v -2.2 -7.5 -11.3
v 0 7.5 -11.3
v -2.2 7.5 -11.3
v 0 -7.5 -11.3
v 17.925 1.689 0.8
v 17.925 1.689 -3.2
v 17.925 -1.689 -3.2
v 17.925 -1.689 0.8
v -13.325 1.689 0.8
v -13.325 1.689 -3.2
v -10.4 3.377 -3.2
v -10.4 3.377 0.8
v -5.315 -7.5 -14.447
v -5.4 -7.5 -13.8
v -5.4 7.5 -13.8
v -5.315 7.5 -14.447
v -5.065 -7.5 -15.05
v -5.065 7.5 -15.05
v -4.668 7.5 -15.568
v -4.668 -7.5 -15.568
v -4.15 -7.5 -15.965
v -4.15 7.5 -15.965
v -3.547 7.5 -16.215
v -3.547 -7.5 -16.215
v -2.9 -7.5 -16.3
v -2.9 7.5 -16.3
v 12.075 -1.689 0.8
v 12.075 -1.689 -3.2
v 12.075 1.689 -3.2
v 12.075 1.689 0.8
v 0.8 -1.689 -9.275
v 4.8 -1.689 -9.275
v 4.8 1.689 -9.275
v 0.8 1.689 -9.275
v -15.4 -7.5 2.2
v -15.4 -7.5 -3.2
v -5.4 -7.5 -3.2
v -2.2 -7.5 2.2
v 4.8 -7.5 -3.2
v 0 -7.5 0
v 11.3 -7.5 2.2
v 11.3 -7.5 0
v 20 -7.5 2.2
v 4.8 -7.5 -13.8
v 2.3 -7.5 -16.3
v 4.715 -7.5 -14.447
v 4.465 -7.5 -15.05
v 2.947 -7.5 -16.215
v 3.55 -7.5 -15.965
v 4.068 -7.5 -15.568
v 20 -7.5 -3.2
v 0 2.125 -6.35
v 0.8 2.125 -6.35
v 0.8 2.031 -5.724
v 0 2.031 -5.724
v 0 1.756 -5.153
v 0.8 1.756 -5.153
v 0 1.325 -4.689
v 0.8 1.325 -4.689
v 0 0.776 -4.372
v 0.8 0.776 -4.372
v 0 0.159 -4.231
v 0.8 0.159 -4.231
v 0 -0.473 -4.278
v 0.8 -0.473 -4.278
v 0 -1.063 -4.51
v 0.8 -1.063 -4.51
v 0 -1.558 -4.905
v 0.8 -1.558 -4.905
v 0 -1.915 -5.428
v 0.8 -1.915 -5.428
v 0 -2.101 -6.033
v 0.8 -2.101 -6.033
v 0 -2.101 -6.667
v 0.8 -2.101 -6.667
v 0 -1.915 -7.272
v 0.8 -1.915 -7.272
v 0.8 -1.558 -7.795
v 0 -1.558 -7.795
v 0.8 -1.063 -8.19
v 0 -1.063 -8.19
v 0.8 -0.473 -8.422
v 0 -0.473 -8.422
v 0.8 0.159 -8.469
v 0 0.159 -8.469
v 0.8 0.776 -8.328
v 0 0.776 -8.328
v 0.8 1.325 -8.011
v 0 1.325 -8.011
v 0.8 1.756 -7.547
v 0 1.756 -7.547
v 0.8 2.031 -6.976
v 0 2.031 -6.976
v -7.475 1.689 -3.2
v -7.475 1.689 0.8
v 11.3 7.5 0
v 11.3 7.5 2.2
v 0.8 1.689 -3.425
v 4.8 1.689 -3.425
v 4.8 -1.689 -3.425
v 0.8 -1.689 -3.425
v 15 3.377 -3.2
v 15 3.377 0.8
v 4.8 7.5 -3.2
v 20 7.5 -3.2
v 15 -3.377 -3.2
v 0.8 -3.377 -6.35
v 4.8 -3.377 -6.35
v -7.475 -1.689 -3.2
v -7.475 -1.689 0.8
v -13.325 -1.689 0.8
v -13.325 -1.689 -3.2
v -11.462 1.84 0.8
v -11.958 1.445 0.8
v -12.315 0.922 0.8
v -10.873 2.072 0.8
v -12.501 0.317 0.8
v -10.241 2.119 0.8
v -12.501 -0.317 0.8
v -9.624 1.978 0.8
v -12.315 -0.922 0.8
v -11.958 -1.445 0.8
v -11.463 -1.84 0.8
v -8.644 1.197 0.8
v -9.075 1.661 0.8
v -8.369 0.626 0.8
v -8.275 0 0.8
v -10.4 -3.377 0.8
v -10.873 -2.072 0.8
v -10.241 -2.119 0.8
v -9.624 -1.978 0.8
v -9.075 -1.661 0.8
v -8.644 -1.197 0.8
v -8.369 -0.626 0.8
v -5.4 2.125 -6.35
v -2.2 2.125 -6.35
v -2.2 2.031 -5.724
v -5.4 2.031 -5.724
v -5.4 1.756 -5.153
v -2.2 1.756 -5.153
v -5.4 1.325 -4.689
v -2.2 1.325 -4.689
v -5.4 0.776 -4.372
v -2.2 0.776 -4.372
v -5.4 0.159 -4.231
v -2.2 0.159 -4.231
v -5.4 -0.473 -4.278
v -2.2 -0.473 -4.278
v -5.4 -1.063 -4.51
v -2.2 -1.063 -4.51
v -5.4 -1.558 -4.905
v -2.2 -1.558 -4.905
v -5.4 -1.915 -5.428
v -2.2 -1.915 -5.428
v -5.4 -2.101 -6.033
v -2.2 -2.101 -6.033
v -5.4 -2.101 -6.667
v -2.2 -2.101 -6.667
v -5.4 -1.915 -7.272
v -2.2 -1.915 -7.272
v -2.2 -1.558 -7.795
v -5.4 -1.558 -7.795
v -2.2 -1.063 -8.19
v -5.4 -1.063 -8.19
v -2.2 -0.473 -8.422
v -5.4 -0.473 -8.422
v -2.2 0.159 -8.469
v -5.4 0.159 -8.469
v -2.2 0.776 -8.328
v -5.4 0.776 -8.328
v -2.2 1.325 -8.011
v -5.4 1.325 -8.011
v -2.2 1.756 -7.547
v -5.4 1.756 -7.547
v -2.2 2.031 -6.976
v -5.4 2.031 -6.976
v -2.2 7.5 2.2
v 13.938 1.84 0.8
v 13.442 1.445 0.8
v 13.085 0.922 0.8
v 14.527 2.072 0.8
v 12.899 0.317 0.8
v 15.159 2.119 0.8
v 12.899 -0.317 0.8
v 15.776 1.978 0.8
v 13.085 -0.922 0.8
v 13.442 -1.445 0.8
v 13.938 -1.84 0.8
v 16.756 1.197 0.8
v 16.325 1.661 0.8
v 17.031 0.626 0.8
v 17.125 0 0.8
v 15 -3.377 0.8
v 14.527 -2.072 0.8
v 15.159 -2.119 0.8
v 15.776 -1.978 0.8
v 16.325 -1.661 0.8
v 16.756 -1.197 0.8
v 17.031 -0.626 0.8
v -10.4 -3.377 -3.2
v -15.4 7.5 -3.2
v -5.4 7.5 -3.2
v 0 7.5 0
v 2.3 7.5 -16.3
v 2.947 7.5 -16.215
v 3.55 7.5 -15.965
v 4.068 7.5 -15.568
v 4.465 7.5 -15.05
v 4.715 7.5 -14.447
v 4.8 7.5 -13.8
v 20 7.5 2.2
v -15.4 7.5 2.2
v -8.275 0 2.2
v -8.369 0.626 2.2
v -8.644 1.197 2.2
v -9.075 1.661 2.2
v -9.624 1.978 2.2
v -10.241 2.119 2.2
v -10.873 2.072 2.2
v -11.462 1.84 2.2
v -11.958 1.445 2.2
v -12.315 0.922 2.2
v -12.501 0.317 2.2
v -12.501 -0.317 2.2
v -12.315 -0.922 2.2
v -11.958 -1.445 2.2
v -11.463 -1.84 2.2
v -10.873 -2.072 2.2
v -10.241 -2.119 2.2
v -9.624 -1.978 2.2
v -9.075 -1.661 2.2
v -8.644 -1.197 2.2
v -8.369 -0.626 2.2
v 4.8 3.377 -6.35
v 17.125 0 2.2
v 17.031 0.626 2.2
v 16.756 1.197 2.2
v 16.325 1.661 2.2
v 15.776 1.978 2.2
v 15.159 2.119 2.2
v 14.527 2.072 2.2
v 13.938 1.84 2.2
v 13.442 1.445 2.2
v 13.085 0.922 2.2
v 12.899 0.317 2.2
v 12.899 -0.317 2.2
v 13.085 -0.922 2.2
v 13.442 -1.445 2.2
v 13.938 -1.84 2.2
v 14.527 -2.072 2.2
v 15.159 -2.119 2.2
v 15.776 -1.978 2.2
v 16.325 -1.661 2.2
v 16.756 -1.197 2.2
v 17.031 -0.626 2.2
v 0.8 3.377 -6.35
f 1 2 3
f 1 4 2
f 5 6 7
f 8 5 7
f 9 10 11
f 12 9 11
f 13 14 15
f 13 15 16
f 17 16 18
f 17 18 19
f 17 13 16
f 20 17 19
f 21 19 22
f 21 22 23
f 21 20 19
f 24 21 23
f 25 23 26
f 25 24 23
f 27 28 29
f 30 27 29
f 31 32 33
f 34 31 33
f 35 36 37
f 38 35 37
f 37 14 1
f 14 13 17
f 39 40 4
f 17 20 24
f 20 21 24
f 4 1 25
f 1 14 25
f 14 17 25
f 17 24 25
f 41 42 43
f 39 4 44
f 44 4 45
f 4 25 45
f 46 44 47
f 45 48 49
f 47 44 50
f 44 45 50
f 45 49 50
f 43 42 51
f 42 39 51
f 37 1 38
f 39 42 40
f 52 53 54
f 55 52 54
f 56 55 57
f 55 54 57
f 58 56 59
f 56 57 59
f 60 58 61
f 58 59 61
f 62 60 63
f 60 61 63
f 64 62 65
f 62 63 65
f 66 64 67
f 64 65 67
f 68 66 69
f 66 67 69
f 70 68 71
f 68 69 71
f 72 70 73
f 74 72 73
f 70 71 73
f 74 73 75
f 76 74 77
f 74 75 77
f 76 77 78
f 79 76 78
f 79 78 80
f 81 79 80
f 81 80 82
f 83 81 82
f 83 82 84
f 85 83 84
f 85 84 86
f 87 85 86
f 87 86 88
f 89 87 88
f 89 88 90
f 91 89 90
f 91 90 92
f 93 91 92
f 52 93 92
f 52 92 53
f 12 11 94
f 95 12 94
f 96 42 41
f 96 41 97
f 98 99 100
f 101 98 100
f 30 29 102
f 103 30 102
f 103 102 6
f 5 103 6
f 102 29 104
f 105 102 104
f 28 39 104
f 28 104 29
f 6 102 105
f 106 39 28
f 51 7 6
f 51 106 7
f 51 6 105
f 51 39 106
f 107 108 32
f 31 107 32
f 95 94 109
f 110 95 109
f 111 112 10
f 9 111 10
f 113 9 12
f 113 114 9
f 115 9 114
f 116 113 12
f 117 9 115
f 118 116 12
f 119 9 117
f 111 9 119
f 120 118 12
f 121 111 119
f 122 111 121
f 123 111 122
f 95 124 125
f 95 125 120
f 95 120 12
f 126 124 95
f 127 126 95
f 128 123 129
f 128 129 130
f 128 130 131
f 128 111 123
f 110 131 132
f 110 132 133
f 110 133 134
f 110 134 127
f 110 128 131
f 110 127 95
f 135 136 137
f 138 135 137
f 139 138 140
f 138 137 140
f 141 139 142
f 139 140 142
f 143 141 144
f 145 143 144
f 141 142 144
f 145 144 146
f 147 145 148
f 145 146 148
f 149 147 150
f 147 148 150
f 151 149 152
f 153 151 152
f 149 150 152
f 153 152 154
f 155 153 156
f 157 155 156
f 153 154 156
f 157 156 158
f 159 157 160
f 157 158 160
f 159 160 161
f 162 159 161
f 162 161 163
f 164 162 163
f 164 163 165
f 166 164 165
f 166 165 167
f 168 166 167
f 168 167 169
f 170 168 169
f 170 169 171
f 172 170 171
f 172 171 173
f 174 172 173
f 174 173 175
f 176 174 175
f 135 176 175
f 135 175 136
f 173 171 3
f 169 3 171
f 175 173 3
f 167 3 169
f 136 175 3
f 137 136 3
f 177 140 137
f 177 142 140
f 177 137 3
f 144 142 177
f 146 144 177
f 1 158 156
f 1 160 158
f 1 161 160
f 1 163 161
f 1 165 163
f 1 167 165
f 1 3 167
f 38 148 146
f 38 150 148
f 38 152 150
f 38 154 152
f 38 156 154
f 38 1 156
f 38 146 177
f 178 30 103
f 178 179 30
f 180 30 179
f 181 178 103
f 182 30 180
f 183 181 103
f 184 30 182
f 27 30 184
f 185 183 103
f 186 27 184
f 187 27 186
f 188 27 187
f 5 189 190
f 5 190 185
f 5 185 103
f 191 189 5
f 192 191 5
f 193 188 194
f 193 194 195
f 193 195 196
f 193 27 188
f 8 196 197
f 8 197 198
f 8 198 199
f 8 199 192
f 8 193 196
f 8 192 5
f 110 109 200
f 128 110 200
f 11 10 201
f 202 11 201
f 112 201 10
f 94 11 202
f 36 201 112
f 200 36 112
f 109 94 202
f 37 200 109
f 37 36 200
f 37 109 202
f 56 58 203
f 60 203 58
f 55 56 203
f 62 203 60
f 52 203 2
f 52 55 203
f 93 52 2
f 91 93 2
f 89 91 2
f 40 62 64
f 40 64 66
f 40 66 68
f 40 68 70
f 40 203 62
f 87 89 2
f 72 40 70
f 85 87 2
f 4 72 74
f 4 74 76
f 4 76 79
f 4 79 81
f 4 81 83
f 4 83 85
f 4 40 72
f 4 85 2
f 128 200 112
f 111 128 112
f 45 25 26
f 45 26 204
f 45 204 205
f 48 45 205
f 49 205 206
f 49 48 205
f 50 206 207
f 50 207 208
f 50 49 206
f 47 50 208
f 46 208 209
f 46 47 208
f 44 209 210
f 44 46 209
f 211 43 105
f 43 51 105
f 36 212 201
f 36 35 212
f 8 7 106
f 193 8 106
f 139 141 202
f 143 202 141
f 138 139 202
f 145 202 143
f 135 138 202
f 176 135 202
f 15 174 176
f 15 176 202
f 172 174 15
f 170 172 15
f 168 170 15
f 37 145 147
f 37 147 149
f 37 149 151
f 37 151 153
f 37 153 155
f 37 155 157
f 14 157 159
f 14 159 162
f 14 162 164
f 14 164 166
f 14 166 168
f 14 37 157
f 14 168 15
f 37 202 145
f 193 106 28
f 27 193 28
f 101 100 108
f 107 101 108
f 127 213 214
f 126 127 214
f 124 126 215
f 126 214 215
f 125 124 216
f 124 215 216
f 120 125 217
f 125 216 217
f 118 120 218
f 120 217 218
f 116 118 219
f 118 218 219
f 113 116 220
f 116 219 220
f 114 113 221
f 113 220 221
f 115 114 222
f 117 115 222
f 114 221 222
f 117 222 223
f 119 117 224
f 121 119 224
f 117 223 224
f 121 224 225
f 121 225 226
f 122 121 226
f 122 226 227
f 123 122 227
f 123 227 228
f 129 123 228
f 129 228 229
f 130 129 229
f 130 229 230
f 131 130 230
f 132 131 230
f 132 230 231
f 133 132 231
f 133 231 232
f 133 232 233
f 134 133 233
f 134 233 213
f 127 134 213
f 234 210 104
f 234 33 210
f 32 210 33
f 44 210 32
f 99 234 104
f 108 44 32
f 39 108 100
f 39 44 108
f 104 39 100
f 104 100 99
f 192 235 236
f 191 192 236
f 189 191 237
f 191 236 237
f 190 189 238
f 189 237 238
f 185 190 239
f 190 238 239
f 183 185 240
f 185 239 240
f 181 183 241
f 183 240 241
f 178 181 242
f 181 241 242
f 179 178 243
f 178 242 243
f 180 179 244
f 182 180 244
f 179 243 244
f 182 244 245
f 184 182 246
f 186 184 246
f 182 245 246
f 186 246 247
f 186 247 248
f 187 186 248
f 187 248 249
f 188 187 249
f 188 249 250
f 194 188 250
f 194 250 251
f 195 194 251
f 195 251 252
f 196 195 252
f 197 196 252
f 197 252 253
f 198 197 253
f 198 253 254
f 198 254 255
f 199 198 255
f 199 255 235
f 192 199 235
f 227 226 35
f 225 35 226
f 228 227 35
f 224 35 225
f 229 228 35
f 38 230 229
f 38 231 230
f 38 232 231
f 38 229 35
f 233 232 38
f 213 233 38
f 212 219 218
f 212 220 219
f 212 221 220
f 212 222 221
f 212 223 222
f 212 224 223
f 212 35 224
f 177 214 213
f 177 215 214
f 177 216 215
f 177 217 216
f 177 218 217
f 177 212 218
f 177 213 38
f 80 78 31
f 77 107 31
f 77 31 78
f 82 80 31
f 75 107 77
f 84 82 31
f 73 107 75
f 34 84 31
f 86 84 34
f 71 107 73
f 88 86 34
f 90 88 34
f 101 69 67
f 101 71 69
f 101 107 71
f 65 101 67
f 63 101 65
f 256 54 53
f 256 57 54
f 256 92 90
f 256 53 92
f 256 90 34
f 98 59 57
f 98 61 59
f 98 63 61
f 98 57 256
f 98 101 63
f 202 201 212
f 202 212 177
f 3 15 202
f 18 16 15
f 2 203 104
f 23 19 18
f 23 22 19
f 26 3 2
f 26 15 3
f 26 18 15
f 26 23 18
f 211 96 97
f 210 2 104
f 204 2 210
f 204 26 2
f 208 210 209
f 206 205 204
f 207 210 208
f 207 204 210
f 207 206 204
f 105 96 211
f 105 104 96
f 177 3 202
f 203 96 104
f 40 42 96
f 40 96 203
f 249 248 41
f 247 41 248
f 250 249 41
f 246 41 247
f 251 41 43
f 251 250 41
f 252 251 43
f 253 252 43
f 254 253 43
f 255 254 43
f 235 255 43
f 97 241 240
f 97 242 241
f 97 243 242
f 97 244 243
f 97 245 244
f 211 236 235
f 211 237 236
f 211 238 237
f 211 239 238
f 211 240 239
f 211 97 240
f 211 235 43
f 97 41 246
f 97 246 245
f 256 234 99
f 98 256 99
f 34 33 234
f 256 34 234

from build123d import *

# Parameters (mm, degrees)
F1_DEPTH  = 7.5
F2_W      = 8.7
F2_H      = 15
F2_W_2    = 13.2
F3_DEPTH  = 2.2
F4_R      = 2.125
F5_DEPTH  = 25
F7_DEPTH  = 4
F8_R      = 2.125
F9_DEPTH  = 25
F11_DEPTH = 4


with BuildPart() as f1:
    # F0 (on Front) → F1 (new body, symmetric)
    with BuildSketch(Plane.XZ):
        with BuildLine():
            Line((-2.2, 0), (-15.4, 0))
            Line((-15.4, 0), (-15.4, -3.2))
            Line((-15.4, -3.2), (-5.4, -3.2))
            Line((-5.4, -3.2), (-5.4, -13.8))
            ThreePointArc((-5.4, -13.8), (-4.667767, -15.567767), (-2.9, -16.3))
            Line((-2.9, -16.3), (2.3, -16.3))
            ThreePointArc((2.3, -16.3), (4.067767, -15.567767), (4.8, -13.8))
            Line((4.8, -13.8), (4.8, -3.2))
            Line((4.8, -3.2), (20, -3.2))
            Line((20, -3.2), (20, 0))
            Line((20, 0), (0, 0))
            Line((0, 0), (0, -11.3))
            Line((0, -11.3), (-2.2, -11.3))
            Line((-2.2, -11.3), (-2.2, 0))
        make_face()
    extrude(amount=F1_DEPTH, both=True)

    # F2 (on face) → F3 (join)
    with BuildSketch(Plane.XY):
        with Locations((15.65, 0)):
            Rectangle(F2_W, F2_H)
        with Locations((-8.8, 0)):
            Rectangle(F2_W_2, F2_H)
    extrude(amount=F3_DEPTH)

    # F4 (on face) → F5 (cut)
    with BuildSketch(Plane.XY.offset(2.2)):
        with Locations((-10.4, 0)):
            Circle(F4_R)
        with Locations((15, 0)):
            Circle(F4_R)
    extrude(amount=-F5_DEPTH, mode=Mode.SUBTRACT)

    # F6 (on face) → F7 (cut)
    with BuildSketch(Plane(origin=(0, 0, -3.2), x_dir=(1, 0, 0), z_dir=(0, 0, -1))):
        Polygon((-7.475, -1.68875), (-7.475, 1.68875), (-10.4, 3.377499), (-13.325, 1.68875), (-13.325, -1.68875), (-10.4, -3.377499), align=None)
        Polygon((17.925, -1.68875), (17.925, 1.68875), (15, 3.377499), (12.075, 1.68875), (12.075, -1.68875), (15, -3.377499), align=None)
    extrude(amount=-F7_DEPTH, mode=Mode.SUBTRACT)

    # F8 (on face) → F9 (cut)
    with BuildSketch(Plane.YZ.offset(4.8)):
        with Locations((0, -6.35)):
            Circle(F8_R)
    extrude(amount=-F9_DEPTH, mode=Mode.SUBTRACT)

    # F10 (on face) → F11 (cut)
    with BuildSketch(Plane.YZ.offset(4.8)):
        Polygon((-1.68875, -9.275), (1.68875, -9.275), (3.377499, -6.35), (1.68875, -3.425), (-1.68875, -3.425), (-3.377499, -6.35), align=None)
    extrude(amount=-F11_DEPTH, mode=Mode.SUBTRACT)


solid = f1.part
